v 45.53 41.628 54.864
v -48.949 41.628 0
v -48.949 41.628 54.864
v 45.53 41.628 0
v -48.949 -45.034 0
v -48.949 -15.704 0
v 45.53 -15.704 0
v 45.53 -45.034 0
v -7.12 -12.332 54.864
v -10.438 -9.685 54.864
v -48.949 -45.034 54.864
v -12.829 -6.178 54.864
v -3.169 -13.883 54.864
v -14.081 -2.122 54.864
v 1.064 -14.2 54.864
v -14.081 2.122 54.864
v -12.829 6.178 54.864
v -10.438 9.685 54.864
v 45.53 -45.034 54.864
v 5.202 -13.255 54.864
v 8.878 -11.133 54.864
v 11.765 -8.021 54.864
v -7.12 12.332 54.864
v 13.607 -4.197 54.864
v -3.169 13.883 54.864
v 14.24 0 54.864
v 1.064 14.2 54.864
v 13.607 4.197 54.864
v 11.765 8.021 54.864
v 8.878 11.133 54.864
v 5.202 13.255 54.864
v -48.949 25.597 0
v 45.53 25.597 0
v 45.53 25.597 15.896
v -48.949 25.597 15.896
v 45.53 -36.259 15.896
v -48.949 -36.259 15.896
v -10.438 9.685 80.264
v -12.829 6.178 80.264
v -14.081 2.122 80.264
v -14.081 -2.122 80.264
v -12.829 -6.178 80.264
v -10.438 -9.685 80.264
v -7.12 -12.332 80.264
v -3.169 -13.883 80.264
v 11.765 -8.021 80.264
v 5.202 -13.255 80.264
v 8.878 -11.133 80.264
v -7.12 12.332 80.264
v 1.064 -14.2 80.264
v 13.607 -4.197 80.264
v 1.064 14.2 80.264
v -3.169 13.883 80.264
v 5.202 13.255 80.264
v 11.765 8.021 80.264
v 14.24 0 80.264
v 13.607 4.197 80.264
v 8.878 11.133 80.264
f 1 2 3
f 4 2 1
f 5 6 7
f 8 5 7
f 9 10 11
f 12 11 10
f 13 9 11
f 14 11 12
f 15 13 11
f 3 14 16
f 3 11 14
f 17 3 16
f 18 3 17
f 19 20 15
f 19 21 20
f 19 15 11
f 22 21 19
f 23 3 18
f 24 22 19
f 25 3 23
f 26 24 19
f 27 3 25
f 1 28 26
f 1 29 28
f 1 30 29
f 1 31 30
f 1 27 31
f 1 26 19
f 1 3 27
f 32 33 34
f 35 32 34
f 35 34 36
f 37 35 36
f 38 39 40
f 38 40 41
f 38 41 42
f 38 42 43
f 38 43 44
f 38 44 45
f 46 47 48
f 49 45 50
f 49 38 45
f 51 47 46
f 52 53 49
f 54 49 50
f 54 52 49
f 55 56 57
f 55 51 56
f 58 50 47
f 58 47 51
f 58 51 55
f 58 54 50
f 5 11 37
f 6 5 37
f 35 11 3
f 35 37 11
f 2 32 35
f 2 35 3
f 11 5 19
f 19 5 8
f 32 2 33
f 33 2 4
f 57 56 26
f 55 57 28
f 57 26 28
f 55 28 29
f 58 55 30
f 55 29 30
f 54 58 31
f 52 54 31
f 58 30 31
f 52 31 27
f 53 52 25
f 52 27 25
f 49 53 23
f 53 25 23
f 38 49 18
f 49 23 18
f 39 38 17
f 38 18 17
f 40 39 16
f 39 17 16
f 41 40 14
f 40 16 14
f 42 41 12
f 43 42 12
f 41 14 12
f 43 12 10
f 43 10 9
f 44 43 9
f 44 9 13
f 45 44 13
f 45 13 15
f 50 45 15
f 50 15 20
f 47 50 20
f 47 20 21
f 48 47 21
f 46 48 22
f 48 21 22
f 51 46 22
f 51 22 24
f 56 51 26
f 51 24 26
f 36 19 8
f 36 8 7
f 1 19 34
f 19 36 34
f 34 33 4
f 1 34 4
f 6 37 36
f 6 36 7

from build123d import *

# Parameters (mm, degrees)
F0_W     = 94.4796726108
F0_H     = 86.6620987654
F1_DEPTH = 54.864
F3_DEPTH = 94.4806726108
F4_R     = 14.2396166793
F5_DEPTH = 25.4


with BuildPart() as f1:
    # F0 (on Top) → F1 (new body)
    with BuildSketch(Plane.XY):
        with Locations((-1.709651202, -1.7030909657)):
            Rectangle(F0_W, F0_H)
    extrude(amount=F1_DEPTH)

    # F2 (on face) → F3 (cut, through all)
    with BuildSketch(Plane.YZ.offset(45.5301851034)):
        Polygon((-36.2590327859, 15.8963445574), (-15.7042443752, 0), (25.5974382162, 0), (25.5974382162, 15.8963445574), align=None)
    extrude(amount=-F3_DEPTH, mode=Mode.SUBTRACT)

    # F4 (on face) → F5 (join)
    with BuildSketch(Plane.XY.offset(54.864)):
        Circle(F4_R)
    extrude(amount=F5_DEPTH)


solid = f1.part
